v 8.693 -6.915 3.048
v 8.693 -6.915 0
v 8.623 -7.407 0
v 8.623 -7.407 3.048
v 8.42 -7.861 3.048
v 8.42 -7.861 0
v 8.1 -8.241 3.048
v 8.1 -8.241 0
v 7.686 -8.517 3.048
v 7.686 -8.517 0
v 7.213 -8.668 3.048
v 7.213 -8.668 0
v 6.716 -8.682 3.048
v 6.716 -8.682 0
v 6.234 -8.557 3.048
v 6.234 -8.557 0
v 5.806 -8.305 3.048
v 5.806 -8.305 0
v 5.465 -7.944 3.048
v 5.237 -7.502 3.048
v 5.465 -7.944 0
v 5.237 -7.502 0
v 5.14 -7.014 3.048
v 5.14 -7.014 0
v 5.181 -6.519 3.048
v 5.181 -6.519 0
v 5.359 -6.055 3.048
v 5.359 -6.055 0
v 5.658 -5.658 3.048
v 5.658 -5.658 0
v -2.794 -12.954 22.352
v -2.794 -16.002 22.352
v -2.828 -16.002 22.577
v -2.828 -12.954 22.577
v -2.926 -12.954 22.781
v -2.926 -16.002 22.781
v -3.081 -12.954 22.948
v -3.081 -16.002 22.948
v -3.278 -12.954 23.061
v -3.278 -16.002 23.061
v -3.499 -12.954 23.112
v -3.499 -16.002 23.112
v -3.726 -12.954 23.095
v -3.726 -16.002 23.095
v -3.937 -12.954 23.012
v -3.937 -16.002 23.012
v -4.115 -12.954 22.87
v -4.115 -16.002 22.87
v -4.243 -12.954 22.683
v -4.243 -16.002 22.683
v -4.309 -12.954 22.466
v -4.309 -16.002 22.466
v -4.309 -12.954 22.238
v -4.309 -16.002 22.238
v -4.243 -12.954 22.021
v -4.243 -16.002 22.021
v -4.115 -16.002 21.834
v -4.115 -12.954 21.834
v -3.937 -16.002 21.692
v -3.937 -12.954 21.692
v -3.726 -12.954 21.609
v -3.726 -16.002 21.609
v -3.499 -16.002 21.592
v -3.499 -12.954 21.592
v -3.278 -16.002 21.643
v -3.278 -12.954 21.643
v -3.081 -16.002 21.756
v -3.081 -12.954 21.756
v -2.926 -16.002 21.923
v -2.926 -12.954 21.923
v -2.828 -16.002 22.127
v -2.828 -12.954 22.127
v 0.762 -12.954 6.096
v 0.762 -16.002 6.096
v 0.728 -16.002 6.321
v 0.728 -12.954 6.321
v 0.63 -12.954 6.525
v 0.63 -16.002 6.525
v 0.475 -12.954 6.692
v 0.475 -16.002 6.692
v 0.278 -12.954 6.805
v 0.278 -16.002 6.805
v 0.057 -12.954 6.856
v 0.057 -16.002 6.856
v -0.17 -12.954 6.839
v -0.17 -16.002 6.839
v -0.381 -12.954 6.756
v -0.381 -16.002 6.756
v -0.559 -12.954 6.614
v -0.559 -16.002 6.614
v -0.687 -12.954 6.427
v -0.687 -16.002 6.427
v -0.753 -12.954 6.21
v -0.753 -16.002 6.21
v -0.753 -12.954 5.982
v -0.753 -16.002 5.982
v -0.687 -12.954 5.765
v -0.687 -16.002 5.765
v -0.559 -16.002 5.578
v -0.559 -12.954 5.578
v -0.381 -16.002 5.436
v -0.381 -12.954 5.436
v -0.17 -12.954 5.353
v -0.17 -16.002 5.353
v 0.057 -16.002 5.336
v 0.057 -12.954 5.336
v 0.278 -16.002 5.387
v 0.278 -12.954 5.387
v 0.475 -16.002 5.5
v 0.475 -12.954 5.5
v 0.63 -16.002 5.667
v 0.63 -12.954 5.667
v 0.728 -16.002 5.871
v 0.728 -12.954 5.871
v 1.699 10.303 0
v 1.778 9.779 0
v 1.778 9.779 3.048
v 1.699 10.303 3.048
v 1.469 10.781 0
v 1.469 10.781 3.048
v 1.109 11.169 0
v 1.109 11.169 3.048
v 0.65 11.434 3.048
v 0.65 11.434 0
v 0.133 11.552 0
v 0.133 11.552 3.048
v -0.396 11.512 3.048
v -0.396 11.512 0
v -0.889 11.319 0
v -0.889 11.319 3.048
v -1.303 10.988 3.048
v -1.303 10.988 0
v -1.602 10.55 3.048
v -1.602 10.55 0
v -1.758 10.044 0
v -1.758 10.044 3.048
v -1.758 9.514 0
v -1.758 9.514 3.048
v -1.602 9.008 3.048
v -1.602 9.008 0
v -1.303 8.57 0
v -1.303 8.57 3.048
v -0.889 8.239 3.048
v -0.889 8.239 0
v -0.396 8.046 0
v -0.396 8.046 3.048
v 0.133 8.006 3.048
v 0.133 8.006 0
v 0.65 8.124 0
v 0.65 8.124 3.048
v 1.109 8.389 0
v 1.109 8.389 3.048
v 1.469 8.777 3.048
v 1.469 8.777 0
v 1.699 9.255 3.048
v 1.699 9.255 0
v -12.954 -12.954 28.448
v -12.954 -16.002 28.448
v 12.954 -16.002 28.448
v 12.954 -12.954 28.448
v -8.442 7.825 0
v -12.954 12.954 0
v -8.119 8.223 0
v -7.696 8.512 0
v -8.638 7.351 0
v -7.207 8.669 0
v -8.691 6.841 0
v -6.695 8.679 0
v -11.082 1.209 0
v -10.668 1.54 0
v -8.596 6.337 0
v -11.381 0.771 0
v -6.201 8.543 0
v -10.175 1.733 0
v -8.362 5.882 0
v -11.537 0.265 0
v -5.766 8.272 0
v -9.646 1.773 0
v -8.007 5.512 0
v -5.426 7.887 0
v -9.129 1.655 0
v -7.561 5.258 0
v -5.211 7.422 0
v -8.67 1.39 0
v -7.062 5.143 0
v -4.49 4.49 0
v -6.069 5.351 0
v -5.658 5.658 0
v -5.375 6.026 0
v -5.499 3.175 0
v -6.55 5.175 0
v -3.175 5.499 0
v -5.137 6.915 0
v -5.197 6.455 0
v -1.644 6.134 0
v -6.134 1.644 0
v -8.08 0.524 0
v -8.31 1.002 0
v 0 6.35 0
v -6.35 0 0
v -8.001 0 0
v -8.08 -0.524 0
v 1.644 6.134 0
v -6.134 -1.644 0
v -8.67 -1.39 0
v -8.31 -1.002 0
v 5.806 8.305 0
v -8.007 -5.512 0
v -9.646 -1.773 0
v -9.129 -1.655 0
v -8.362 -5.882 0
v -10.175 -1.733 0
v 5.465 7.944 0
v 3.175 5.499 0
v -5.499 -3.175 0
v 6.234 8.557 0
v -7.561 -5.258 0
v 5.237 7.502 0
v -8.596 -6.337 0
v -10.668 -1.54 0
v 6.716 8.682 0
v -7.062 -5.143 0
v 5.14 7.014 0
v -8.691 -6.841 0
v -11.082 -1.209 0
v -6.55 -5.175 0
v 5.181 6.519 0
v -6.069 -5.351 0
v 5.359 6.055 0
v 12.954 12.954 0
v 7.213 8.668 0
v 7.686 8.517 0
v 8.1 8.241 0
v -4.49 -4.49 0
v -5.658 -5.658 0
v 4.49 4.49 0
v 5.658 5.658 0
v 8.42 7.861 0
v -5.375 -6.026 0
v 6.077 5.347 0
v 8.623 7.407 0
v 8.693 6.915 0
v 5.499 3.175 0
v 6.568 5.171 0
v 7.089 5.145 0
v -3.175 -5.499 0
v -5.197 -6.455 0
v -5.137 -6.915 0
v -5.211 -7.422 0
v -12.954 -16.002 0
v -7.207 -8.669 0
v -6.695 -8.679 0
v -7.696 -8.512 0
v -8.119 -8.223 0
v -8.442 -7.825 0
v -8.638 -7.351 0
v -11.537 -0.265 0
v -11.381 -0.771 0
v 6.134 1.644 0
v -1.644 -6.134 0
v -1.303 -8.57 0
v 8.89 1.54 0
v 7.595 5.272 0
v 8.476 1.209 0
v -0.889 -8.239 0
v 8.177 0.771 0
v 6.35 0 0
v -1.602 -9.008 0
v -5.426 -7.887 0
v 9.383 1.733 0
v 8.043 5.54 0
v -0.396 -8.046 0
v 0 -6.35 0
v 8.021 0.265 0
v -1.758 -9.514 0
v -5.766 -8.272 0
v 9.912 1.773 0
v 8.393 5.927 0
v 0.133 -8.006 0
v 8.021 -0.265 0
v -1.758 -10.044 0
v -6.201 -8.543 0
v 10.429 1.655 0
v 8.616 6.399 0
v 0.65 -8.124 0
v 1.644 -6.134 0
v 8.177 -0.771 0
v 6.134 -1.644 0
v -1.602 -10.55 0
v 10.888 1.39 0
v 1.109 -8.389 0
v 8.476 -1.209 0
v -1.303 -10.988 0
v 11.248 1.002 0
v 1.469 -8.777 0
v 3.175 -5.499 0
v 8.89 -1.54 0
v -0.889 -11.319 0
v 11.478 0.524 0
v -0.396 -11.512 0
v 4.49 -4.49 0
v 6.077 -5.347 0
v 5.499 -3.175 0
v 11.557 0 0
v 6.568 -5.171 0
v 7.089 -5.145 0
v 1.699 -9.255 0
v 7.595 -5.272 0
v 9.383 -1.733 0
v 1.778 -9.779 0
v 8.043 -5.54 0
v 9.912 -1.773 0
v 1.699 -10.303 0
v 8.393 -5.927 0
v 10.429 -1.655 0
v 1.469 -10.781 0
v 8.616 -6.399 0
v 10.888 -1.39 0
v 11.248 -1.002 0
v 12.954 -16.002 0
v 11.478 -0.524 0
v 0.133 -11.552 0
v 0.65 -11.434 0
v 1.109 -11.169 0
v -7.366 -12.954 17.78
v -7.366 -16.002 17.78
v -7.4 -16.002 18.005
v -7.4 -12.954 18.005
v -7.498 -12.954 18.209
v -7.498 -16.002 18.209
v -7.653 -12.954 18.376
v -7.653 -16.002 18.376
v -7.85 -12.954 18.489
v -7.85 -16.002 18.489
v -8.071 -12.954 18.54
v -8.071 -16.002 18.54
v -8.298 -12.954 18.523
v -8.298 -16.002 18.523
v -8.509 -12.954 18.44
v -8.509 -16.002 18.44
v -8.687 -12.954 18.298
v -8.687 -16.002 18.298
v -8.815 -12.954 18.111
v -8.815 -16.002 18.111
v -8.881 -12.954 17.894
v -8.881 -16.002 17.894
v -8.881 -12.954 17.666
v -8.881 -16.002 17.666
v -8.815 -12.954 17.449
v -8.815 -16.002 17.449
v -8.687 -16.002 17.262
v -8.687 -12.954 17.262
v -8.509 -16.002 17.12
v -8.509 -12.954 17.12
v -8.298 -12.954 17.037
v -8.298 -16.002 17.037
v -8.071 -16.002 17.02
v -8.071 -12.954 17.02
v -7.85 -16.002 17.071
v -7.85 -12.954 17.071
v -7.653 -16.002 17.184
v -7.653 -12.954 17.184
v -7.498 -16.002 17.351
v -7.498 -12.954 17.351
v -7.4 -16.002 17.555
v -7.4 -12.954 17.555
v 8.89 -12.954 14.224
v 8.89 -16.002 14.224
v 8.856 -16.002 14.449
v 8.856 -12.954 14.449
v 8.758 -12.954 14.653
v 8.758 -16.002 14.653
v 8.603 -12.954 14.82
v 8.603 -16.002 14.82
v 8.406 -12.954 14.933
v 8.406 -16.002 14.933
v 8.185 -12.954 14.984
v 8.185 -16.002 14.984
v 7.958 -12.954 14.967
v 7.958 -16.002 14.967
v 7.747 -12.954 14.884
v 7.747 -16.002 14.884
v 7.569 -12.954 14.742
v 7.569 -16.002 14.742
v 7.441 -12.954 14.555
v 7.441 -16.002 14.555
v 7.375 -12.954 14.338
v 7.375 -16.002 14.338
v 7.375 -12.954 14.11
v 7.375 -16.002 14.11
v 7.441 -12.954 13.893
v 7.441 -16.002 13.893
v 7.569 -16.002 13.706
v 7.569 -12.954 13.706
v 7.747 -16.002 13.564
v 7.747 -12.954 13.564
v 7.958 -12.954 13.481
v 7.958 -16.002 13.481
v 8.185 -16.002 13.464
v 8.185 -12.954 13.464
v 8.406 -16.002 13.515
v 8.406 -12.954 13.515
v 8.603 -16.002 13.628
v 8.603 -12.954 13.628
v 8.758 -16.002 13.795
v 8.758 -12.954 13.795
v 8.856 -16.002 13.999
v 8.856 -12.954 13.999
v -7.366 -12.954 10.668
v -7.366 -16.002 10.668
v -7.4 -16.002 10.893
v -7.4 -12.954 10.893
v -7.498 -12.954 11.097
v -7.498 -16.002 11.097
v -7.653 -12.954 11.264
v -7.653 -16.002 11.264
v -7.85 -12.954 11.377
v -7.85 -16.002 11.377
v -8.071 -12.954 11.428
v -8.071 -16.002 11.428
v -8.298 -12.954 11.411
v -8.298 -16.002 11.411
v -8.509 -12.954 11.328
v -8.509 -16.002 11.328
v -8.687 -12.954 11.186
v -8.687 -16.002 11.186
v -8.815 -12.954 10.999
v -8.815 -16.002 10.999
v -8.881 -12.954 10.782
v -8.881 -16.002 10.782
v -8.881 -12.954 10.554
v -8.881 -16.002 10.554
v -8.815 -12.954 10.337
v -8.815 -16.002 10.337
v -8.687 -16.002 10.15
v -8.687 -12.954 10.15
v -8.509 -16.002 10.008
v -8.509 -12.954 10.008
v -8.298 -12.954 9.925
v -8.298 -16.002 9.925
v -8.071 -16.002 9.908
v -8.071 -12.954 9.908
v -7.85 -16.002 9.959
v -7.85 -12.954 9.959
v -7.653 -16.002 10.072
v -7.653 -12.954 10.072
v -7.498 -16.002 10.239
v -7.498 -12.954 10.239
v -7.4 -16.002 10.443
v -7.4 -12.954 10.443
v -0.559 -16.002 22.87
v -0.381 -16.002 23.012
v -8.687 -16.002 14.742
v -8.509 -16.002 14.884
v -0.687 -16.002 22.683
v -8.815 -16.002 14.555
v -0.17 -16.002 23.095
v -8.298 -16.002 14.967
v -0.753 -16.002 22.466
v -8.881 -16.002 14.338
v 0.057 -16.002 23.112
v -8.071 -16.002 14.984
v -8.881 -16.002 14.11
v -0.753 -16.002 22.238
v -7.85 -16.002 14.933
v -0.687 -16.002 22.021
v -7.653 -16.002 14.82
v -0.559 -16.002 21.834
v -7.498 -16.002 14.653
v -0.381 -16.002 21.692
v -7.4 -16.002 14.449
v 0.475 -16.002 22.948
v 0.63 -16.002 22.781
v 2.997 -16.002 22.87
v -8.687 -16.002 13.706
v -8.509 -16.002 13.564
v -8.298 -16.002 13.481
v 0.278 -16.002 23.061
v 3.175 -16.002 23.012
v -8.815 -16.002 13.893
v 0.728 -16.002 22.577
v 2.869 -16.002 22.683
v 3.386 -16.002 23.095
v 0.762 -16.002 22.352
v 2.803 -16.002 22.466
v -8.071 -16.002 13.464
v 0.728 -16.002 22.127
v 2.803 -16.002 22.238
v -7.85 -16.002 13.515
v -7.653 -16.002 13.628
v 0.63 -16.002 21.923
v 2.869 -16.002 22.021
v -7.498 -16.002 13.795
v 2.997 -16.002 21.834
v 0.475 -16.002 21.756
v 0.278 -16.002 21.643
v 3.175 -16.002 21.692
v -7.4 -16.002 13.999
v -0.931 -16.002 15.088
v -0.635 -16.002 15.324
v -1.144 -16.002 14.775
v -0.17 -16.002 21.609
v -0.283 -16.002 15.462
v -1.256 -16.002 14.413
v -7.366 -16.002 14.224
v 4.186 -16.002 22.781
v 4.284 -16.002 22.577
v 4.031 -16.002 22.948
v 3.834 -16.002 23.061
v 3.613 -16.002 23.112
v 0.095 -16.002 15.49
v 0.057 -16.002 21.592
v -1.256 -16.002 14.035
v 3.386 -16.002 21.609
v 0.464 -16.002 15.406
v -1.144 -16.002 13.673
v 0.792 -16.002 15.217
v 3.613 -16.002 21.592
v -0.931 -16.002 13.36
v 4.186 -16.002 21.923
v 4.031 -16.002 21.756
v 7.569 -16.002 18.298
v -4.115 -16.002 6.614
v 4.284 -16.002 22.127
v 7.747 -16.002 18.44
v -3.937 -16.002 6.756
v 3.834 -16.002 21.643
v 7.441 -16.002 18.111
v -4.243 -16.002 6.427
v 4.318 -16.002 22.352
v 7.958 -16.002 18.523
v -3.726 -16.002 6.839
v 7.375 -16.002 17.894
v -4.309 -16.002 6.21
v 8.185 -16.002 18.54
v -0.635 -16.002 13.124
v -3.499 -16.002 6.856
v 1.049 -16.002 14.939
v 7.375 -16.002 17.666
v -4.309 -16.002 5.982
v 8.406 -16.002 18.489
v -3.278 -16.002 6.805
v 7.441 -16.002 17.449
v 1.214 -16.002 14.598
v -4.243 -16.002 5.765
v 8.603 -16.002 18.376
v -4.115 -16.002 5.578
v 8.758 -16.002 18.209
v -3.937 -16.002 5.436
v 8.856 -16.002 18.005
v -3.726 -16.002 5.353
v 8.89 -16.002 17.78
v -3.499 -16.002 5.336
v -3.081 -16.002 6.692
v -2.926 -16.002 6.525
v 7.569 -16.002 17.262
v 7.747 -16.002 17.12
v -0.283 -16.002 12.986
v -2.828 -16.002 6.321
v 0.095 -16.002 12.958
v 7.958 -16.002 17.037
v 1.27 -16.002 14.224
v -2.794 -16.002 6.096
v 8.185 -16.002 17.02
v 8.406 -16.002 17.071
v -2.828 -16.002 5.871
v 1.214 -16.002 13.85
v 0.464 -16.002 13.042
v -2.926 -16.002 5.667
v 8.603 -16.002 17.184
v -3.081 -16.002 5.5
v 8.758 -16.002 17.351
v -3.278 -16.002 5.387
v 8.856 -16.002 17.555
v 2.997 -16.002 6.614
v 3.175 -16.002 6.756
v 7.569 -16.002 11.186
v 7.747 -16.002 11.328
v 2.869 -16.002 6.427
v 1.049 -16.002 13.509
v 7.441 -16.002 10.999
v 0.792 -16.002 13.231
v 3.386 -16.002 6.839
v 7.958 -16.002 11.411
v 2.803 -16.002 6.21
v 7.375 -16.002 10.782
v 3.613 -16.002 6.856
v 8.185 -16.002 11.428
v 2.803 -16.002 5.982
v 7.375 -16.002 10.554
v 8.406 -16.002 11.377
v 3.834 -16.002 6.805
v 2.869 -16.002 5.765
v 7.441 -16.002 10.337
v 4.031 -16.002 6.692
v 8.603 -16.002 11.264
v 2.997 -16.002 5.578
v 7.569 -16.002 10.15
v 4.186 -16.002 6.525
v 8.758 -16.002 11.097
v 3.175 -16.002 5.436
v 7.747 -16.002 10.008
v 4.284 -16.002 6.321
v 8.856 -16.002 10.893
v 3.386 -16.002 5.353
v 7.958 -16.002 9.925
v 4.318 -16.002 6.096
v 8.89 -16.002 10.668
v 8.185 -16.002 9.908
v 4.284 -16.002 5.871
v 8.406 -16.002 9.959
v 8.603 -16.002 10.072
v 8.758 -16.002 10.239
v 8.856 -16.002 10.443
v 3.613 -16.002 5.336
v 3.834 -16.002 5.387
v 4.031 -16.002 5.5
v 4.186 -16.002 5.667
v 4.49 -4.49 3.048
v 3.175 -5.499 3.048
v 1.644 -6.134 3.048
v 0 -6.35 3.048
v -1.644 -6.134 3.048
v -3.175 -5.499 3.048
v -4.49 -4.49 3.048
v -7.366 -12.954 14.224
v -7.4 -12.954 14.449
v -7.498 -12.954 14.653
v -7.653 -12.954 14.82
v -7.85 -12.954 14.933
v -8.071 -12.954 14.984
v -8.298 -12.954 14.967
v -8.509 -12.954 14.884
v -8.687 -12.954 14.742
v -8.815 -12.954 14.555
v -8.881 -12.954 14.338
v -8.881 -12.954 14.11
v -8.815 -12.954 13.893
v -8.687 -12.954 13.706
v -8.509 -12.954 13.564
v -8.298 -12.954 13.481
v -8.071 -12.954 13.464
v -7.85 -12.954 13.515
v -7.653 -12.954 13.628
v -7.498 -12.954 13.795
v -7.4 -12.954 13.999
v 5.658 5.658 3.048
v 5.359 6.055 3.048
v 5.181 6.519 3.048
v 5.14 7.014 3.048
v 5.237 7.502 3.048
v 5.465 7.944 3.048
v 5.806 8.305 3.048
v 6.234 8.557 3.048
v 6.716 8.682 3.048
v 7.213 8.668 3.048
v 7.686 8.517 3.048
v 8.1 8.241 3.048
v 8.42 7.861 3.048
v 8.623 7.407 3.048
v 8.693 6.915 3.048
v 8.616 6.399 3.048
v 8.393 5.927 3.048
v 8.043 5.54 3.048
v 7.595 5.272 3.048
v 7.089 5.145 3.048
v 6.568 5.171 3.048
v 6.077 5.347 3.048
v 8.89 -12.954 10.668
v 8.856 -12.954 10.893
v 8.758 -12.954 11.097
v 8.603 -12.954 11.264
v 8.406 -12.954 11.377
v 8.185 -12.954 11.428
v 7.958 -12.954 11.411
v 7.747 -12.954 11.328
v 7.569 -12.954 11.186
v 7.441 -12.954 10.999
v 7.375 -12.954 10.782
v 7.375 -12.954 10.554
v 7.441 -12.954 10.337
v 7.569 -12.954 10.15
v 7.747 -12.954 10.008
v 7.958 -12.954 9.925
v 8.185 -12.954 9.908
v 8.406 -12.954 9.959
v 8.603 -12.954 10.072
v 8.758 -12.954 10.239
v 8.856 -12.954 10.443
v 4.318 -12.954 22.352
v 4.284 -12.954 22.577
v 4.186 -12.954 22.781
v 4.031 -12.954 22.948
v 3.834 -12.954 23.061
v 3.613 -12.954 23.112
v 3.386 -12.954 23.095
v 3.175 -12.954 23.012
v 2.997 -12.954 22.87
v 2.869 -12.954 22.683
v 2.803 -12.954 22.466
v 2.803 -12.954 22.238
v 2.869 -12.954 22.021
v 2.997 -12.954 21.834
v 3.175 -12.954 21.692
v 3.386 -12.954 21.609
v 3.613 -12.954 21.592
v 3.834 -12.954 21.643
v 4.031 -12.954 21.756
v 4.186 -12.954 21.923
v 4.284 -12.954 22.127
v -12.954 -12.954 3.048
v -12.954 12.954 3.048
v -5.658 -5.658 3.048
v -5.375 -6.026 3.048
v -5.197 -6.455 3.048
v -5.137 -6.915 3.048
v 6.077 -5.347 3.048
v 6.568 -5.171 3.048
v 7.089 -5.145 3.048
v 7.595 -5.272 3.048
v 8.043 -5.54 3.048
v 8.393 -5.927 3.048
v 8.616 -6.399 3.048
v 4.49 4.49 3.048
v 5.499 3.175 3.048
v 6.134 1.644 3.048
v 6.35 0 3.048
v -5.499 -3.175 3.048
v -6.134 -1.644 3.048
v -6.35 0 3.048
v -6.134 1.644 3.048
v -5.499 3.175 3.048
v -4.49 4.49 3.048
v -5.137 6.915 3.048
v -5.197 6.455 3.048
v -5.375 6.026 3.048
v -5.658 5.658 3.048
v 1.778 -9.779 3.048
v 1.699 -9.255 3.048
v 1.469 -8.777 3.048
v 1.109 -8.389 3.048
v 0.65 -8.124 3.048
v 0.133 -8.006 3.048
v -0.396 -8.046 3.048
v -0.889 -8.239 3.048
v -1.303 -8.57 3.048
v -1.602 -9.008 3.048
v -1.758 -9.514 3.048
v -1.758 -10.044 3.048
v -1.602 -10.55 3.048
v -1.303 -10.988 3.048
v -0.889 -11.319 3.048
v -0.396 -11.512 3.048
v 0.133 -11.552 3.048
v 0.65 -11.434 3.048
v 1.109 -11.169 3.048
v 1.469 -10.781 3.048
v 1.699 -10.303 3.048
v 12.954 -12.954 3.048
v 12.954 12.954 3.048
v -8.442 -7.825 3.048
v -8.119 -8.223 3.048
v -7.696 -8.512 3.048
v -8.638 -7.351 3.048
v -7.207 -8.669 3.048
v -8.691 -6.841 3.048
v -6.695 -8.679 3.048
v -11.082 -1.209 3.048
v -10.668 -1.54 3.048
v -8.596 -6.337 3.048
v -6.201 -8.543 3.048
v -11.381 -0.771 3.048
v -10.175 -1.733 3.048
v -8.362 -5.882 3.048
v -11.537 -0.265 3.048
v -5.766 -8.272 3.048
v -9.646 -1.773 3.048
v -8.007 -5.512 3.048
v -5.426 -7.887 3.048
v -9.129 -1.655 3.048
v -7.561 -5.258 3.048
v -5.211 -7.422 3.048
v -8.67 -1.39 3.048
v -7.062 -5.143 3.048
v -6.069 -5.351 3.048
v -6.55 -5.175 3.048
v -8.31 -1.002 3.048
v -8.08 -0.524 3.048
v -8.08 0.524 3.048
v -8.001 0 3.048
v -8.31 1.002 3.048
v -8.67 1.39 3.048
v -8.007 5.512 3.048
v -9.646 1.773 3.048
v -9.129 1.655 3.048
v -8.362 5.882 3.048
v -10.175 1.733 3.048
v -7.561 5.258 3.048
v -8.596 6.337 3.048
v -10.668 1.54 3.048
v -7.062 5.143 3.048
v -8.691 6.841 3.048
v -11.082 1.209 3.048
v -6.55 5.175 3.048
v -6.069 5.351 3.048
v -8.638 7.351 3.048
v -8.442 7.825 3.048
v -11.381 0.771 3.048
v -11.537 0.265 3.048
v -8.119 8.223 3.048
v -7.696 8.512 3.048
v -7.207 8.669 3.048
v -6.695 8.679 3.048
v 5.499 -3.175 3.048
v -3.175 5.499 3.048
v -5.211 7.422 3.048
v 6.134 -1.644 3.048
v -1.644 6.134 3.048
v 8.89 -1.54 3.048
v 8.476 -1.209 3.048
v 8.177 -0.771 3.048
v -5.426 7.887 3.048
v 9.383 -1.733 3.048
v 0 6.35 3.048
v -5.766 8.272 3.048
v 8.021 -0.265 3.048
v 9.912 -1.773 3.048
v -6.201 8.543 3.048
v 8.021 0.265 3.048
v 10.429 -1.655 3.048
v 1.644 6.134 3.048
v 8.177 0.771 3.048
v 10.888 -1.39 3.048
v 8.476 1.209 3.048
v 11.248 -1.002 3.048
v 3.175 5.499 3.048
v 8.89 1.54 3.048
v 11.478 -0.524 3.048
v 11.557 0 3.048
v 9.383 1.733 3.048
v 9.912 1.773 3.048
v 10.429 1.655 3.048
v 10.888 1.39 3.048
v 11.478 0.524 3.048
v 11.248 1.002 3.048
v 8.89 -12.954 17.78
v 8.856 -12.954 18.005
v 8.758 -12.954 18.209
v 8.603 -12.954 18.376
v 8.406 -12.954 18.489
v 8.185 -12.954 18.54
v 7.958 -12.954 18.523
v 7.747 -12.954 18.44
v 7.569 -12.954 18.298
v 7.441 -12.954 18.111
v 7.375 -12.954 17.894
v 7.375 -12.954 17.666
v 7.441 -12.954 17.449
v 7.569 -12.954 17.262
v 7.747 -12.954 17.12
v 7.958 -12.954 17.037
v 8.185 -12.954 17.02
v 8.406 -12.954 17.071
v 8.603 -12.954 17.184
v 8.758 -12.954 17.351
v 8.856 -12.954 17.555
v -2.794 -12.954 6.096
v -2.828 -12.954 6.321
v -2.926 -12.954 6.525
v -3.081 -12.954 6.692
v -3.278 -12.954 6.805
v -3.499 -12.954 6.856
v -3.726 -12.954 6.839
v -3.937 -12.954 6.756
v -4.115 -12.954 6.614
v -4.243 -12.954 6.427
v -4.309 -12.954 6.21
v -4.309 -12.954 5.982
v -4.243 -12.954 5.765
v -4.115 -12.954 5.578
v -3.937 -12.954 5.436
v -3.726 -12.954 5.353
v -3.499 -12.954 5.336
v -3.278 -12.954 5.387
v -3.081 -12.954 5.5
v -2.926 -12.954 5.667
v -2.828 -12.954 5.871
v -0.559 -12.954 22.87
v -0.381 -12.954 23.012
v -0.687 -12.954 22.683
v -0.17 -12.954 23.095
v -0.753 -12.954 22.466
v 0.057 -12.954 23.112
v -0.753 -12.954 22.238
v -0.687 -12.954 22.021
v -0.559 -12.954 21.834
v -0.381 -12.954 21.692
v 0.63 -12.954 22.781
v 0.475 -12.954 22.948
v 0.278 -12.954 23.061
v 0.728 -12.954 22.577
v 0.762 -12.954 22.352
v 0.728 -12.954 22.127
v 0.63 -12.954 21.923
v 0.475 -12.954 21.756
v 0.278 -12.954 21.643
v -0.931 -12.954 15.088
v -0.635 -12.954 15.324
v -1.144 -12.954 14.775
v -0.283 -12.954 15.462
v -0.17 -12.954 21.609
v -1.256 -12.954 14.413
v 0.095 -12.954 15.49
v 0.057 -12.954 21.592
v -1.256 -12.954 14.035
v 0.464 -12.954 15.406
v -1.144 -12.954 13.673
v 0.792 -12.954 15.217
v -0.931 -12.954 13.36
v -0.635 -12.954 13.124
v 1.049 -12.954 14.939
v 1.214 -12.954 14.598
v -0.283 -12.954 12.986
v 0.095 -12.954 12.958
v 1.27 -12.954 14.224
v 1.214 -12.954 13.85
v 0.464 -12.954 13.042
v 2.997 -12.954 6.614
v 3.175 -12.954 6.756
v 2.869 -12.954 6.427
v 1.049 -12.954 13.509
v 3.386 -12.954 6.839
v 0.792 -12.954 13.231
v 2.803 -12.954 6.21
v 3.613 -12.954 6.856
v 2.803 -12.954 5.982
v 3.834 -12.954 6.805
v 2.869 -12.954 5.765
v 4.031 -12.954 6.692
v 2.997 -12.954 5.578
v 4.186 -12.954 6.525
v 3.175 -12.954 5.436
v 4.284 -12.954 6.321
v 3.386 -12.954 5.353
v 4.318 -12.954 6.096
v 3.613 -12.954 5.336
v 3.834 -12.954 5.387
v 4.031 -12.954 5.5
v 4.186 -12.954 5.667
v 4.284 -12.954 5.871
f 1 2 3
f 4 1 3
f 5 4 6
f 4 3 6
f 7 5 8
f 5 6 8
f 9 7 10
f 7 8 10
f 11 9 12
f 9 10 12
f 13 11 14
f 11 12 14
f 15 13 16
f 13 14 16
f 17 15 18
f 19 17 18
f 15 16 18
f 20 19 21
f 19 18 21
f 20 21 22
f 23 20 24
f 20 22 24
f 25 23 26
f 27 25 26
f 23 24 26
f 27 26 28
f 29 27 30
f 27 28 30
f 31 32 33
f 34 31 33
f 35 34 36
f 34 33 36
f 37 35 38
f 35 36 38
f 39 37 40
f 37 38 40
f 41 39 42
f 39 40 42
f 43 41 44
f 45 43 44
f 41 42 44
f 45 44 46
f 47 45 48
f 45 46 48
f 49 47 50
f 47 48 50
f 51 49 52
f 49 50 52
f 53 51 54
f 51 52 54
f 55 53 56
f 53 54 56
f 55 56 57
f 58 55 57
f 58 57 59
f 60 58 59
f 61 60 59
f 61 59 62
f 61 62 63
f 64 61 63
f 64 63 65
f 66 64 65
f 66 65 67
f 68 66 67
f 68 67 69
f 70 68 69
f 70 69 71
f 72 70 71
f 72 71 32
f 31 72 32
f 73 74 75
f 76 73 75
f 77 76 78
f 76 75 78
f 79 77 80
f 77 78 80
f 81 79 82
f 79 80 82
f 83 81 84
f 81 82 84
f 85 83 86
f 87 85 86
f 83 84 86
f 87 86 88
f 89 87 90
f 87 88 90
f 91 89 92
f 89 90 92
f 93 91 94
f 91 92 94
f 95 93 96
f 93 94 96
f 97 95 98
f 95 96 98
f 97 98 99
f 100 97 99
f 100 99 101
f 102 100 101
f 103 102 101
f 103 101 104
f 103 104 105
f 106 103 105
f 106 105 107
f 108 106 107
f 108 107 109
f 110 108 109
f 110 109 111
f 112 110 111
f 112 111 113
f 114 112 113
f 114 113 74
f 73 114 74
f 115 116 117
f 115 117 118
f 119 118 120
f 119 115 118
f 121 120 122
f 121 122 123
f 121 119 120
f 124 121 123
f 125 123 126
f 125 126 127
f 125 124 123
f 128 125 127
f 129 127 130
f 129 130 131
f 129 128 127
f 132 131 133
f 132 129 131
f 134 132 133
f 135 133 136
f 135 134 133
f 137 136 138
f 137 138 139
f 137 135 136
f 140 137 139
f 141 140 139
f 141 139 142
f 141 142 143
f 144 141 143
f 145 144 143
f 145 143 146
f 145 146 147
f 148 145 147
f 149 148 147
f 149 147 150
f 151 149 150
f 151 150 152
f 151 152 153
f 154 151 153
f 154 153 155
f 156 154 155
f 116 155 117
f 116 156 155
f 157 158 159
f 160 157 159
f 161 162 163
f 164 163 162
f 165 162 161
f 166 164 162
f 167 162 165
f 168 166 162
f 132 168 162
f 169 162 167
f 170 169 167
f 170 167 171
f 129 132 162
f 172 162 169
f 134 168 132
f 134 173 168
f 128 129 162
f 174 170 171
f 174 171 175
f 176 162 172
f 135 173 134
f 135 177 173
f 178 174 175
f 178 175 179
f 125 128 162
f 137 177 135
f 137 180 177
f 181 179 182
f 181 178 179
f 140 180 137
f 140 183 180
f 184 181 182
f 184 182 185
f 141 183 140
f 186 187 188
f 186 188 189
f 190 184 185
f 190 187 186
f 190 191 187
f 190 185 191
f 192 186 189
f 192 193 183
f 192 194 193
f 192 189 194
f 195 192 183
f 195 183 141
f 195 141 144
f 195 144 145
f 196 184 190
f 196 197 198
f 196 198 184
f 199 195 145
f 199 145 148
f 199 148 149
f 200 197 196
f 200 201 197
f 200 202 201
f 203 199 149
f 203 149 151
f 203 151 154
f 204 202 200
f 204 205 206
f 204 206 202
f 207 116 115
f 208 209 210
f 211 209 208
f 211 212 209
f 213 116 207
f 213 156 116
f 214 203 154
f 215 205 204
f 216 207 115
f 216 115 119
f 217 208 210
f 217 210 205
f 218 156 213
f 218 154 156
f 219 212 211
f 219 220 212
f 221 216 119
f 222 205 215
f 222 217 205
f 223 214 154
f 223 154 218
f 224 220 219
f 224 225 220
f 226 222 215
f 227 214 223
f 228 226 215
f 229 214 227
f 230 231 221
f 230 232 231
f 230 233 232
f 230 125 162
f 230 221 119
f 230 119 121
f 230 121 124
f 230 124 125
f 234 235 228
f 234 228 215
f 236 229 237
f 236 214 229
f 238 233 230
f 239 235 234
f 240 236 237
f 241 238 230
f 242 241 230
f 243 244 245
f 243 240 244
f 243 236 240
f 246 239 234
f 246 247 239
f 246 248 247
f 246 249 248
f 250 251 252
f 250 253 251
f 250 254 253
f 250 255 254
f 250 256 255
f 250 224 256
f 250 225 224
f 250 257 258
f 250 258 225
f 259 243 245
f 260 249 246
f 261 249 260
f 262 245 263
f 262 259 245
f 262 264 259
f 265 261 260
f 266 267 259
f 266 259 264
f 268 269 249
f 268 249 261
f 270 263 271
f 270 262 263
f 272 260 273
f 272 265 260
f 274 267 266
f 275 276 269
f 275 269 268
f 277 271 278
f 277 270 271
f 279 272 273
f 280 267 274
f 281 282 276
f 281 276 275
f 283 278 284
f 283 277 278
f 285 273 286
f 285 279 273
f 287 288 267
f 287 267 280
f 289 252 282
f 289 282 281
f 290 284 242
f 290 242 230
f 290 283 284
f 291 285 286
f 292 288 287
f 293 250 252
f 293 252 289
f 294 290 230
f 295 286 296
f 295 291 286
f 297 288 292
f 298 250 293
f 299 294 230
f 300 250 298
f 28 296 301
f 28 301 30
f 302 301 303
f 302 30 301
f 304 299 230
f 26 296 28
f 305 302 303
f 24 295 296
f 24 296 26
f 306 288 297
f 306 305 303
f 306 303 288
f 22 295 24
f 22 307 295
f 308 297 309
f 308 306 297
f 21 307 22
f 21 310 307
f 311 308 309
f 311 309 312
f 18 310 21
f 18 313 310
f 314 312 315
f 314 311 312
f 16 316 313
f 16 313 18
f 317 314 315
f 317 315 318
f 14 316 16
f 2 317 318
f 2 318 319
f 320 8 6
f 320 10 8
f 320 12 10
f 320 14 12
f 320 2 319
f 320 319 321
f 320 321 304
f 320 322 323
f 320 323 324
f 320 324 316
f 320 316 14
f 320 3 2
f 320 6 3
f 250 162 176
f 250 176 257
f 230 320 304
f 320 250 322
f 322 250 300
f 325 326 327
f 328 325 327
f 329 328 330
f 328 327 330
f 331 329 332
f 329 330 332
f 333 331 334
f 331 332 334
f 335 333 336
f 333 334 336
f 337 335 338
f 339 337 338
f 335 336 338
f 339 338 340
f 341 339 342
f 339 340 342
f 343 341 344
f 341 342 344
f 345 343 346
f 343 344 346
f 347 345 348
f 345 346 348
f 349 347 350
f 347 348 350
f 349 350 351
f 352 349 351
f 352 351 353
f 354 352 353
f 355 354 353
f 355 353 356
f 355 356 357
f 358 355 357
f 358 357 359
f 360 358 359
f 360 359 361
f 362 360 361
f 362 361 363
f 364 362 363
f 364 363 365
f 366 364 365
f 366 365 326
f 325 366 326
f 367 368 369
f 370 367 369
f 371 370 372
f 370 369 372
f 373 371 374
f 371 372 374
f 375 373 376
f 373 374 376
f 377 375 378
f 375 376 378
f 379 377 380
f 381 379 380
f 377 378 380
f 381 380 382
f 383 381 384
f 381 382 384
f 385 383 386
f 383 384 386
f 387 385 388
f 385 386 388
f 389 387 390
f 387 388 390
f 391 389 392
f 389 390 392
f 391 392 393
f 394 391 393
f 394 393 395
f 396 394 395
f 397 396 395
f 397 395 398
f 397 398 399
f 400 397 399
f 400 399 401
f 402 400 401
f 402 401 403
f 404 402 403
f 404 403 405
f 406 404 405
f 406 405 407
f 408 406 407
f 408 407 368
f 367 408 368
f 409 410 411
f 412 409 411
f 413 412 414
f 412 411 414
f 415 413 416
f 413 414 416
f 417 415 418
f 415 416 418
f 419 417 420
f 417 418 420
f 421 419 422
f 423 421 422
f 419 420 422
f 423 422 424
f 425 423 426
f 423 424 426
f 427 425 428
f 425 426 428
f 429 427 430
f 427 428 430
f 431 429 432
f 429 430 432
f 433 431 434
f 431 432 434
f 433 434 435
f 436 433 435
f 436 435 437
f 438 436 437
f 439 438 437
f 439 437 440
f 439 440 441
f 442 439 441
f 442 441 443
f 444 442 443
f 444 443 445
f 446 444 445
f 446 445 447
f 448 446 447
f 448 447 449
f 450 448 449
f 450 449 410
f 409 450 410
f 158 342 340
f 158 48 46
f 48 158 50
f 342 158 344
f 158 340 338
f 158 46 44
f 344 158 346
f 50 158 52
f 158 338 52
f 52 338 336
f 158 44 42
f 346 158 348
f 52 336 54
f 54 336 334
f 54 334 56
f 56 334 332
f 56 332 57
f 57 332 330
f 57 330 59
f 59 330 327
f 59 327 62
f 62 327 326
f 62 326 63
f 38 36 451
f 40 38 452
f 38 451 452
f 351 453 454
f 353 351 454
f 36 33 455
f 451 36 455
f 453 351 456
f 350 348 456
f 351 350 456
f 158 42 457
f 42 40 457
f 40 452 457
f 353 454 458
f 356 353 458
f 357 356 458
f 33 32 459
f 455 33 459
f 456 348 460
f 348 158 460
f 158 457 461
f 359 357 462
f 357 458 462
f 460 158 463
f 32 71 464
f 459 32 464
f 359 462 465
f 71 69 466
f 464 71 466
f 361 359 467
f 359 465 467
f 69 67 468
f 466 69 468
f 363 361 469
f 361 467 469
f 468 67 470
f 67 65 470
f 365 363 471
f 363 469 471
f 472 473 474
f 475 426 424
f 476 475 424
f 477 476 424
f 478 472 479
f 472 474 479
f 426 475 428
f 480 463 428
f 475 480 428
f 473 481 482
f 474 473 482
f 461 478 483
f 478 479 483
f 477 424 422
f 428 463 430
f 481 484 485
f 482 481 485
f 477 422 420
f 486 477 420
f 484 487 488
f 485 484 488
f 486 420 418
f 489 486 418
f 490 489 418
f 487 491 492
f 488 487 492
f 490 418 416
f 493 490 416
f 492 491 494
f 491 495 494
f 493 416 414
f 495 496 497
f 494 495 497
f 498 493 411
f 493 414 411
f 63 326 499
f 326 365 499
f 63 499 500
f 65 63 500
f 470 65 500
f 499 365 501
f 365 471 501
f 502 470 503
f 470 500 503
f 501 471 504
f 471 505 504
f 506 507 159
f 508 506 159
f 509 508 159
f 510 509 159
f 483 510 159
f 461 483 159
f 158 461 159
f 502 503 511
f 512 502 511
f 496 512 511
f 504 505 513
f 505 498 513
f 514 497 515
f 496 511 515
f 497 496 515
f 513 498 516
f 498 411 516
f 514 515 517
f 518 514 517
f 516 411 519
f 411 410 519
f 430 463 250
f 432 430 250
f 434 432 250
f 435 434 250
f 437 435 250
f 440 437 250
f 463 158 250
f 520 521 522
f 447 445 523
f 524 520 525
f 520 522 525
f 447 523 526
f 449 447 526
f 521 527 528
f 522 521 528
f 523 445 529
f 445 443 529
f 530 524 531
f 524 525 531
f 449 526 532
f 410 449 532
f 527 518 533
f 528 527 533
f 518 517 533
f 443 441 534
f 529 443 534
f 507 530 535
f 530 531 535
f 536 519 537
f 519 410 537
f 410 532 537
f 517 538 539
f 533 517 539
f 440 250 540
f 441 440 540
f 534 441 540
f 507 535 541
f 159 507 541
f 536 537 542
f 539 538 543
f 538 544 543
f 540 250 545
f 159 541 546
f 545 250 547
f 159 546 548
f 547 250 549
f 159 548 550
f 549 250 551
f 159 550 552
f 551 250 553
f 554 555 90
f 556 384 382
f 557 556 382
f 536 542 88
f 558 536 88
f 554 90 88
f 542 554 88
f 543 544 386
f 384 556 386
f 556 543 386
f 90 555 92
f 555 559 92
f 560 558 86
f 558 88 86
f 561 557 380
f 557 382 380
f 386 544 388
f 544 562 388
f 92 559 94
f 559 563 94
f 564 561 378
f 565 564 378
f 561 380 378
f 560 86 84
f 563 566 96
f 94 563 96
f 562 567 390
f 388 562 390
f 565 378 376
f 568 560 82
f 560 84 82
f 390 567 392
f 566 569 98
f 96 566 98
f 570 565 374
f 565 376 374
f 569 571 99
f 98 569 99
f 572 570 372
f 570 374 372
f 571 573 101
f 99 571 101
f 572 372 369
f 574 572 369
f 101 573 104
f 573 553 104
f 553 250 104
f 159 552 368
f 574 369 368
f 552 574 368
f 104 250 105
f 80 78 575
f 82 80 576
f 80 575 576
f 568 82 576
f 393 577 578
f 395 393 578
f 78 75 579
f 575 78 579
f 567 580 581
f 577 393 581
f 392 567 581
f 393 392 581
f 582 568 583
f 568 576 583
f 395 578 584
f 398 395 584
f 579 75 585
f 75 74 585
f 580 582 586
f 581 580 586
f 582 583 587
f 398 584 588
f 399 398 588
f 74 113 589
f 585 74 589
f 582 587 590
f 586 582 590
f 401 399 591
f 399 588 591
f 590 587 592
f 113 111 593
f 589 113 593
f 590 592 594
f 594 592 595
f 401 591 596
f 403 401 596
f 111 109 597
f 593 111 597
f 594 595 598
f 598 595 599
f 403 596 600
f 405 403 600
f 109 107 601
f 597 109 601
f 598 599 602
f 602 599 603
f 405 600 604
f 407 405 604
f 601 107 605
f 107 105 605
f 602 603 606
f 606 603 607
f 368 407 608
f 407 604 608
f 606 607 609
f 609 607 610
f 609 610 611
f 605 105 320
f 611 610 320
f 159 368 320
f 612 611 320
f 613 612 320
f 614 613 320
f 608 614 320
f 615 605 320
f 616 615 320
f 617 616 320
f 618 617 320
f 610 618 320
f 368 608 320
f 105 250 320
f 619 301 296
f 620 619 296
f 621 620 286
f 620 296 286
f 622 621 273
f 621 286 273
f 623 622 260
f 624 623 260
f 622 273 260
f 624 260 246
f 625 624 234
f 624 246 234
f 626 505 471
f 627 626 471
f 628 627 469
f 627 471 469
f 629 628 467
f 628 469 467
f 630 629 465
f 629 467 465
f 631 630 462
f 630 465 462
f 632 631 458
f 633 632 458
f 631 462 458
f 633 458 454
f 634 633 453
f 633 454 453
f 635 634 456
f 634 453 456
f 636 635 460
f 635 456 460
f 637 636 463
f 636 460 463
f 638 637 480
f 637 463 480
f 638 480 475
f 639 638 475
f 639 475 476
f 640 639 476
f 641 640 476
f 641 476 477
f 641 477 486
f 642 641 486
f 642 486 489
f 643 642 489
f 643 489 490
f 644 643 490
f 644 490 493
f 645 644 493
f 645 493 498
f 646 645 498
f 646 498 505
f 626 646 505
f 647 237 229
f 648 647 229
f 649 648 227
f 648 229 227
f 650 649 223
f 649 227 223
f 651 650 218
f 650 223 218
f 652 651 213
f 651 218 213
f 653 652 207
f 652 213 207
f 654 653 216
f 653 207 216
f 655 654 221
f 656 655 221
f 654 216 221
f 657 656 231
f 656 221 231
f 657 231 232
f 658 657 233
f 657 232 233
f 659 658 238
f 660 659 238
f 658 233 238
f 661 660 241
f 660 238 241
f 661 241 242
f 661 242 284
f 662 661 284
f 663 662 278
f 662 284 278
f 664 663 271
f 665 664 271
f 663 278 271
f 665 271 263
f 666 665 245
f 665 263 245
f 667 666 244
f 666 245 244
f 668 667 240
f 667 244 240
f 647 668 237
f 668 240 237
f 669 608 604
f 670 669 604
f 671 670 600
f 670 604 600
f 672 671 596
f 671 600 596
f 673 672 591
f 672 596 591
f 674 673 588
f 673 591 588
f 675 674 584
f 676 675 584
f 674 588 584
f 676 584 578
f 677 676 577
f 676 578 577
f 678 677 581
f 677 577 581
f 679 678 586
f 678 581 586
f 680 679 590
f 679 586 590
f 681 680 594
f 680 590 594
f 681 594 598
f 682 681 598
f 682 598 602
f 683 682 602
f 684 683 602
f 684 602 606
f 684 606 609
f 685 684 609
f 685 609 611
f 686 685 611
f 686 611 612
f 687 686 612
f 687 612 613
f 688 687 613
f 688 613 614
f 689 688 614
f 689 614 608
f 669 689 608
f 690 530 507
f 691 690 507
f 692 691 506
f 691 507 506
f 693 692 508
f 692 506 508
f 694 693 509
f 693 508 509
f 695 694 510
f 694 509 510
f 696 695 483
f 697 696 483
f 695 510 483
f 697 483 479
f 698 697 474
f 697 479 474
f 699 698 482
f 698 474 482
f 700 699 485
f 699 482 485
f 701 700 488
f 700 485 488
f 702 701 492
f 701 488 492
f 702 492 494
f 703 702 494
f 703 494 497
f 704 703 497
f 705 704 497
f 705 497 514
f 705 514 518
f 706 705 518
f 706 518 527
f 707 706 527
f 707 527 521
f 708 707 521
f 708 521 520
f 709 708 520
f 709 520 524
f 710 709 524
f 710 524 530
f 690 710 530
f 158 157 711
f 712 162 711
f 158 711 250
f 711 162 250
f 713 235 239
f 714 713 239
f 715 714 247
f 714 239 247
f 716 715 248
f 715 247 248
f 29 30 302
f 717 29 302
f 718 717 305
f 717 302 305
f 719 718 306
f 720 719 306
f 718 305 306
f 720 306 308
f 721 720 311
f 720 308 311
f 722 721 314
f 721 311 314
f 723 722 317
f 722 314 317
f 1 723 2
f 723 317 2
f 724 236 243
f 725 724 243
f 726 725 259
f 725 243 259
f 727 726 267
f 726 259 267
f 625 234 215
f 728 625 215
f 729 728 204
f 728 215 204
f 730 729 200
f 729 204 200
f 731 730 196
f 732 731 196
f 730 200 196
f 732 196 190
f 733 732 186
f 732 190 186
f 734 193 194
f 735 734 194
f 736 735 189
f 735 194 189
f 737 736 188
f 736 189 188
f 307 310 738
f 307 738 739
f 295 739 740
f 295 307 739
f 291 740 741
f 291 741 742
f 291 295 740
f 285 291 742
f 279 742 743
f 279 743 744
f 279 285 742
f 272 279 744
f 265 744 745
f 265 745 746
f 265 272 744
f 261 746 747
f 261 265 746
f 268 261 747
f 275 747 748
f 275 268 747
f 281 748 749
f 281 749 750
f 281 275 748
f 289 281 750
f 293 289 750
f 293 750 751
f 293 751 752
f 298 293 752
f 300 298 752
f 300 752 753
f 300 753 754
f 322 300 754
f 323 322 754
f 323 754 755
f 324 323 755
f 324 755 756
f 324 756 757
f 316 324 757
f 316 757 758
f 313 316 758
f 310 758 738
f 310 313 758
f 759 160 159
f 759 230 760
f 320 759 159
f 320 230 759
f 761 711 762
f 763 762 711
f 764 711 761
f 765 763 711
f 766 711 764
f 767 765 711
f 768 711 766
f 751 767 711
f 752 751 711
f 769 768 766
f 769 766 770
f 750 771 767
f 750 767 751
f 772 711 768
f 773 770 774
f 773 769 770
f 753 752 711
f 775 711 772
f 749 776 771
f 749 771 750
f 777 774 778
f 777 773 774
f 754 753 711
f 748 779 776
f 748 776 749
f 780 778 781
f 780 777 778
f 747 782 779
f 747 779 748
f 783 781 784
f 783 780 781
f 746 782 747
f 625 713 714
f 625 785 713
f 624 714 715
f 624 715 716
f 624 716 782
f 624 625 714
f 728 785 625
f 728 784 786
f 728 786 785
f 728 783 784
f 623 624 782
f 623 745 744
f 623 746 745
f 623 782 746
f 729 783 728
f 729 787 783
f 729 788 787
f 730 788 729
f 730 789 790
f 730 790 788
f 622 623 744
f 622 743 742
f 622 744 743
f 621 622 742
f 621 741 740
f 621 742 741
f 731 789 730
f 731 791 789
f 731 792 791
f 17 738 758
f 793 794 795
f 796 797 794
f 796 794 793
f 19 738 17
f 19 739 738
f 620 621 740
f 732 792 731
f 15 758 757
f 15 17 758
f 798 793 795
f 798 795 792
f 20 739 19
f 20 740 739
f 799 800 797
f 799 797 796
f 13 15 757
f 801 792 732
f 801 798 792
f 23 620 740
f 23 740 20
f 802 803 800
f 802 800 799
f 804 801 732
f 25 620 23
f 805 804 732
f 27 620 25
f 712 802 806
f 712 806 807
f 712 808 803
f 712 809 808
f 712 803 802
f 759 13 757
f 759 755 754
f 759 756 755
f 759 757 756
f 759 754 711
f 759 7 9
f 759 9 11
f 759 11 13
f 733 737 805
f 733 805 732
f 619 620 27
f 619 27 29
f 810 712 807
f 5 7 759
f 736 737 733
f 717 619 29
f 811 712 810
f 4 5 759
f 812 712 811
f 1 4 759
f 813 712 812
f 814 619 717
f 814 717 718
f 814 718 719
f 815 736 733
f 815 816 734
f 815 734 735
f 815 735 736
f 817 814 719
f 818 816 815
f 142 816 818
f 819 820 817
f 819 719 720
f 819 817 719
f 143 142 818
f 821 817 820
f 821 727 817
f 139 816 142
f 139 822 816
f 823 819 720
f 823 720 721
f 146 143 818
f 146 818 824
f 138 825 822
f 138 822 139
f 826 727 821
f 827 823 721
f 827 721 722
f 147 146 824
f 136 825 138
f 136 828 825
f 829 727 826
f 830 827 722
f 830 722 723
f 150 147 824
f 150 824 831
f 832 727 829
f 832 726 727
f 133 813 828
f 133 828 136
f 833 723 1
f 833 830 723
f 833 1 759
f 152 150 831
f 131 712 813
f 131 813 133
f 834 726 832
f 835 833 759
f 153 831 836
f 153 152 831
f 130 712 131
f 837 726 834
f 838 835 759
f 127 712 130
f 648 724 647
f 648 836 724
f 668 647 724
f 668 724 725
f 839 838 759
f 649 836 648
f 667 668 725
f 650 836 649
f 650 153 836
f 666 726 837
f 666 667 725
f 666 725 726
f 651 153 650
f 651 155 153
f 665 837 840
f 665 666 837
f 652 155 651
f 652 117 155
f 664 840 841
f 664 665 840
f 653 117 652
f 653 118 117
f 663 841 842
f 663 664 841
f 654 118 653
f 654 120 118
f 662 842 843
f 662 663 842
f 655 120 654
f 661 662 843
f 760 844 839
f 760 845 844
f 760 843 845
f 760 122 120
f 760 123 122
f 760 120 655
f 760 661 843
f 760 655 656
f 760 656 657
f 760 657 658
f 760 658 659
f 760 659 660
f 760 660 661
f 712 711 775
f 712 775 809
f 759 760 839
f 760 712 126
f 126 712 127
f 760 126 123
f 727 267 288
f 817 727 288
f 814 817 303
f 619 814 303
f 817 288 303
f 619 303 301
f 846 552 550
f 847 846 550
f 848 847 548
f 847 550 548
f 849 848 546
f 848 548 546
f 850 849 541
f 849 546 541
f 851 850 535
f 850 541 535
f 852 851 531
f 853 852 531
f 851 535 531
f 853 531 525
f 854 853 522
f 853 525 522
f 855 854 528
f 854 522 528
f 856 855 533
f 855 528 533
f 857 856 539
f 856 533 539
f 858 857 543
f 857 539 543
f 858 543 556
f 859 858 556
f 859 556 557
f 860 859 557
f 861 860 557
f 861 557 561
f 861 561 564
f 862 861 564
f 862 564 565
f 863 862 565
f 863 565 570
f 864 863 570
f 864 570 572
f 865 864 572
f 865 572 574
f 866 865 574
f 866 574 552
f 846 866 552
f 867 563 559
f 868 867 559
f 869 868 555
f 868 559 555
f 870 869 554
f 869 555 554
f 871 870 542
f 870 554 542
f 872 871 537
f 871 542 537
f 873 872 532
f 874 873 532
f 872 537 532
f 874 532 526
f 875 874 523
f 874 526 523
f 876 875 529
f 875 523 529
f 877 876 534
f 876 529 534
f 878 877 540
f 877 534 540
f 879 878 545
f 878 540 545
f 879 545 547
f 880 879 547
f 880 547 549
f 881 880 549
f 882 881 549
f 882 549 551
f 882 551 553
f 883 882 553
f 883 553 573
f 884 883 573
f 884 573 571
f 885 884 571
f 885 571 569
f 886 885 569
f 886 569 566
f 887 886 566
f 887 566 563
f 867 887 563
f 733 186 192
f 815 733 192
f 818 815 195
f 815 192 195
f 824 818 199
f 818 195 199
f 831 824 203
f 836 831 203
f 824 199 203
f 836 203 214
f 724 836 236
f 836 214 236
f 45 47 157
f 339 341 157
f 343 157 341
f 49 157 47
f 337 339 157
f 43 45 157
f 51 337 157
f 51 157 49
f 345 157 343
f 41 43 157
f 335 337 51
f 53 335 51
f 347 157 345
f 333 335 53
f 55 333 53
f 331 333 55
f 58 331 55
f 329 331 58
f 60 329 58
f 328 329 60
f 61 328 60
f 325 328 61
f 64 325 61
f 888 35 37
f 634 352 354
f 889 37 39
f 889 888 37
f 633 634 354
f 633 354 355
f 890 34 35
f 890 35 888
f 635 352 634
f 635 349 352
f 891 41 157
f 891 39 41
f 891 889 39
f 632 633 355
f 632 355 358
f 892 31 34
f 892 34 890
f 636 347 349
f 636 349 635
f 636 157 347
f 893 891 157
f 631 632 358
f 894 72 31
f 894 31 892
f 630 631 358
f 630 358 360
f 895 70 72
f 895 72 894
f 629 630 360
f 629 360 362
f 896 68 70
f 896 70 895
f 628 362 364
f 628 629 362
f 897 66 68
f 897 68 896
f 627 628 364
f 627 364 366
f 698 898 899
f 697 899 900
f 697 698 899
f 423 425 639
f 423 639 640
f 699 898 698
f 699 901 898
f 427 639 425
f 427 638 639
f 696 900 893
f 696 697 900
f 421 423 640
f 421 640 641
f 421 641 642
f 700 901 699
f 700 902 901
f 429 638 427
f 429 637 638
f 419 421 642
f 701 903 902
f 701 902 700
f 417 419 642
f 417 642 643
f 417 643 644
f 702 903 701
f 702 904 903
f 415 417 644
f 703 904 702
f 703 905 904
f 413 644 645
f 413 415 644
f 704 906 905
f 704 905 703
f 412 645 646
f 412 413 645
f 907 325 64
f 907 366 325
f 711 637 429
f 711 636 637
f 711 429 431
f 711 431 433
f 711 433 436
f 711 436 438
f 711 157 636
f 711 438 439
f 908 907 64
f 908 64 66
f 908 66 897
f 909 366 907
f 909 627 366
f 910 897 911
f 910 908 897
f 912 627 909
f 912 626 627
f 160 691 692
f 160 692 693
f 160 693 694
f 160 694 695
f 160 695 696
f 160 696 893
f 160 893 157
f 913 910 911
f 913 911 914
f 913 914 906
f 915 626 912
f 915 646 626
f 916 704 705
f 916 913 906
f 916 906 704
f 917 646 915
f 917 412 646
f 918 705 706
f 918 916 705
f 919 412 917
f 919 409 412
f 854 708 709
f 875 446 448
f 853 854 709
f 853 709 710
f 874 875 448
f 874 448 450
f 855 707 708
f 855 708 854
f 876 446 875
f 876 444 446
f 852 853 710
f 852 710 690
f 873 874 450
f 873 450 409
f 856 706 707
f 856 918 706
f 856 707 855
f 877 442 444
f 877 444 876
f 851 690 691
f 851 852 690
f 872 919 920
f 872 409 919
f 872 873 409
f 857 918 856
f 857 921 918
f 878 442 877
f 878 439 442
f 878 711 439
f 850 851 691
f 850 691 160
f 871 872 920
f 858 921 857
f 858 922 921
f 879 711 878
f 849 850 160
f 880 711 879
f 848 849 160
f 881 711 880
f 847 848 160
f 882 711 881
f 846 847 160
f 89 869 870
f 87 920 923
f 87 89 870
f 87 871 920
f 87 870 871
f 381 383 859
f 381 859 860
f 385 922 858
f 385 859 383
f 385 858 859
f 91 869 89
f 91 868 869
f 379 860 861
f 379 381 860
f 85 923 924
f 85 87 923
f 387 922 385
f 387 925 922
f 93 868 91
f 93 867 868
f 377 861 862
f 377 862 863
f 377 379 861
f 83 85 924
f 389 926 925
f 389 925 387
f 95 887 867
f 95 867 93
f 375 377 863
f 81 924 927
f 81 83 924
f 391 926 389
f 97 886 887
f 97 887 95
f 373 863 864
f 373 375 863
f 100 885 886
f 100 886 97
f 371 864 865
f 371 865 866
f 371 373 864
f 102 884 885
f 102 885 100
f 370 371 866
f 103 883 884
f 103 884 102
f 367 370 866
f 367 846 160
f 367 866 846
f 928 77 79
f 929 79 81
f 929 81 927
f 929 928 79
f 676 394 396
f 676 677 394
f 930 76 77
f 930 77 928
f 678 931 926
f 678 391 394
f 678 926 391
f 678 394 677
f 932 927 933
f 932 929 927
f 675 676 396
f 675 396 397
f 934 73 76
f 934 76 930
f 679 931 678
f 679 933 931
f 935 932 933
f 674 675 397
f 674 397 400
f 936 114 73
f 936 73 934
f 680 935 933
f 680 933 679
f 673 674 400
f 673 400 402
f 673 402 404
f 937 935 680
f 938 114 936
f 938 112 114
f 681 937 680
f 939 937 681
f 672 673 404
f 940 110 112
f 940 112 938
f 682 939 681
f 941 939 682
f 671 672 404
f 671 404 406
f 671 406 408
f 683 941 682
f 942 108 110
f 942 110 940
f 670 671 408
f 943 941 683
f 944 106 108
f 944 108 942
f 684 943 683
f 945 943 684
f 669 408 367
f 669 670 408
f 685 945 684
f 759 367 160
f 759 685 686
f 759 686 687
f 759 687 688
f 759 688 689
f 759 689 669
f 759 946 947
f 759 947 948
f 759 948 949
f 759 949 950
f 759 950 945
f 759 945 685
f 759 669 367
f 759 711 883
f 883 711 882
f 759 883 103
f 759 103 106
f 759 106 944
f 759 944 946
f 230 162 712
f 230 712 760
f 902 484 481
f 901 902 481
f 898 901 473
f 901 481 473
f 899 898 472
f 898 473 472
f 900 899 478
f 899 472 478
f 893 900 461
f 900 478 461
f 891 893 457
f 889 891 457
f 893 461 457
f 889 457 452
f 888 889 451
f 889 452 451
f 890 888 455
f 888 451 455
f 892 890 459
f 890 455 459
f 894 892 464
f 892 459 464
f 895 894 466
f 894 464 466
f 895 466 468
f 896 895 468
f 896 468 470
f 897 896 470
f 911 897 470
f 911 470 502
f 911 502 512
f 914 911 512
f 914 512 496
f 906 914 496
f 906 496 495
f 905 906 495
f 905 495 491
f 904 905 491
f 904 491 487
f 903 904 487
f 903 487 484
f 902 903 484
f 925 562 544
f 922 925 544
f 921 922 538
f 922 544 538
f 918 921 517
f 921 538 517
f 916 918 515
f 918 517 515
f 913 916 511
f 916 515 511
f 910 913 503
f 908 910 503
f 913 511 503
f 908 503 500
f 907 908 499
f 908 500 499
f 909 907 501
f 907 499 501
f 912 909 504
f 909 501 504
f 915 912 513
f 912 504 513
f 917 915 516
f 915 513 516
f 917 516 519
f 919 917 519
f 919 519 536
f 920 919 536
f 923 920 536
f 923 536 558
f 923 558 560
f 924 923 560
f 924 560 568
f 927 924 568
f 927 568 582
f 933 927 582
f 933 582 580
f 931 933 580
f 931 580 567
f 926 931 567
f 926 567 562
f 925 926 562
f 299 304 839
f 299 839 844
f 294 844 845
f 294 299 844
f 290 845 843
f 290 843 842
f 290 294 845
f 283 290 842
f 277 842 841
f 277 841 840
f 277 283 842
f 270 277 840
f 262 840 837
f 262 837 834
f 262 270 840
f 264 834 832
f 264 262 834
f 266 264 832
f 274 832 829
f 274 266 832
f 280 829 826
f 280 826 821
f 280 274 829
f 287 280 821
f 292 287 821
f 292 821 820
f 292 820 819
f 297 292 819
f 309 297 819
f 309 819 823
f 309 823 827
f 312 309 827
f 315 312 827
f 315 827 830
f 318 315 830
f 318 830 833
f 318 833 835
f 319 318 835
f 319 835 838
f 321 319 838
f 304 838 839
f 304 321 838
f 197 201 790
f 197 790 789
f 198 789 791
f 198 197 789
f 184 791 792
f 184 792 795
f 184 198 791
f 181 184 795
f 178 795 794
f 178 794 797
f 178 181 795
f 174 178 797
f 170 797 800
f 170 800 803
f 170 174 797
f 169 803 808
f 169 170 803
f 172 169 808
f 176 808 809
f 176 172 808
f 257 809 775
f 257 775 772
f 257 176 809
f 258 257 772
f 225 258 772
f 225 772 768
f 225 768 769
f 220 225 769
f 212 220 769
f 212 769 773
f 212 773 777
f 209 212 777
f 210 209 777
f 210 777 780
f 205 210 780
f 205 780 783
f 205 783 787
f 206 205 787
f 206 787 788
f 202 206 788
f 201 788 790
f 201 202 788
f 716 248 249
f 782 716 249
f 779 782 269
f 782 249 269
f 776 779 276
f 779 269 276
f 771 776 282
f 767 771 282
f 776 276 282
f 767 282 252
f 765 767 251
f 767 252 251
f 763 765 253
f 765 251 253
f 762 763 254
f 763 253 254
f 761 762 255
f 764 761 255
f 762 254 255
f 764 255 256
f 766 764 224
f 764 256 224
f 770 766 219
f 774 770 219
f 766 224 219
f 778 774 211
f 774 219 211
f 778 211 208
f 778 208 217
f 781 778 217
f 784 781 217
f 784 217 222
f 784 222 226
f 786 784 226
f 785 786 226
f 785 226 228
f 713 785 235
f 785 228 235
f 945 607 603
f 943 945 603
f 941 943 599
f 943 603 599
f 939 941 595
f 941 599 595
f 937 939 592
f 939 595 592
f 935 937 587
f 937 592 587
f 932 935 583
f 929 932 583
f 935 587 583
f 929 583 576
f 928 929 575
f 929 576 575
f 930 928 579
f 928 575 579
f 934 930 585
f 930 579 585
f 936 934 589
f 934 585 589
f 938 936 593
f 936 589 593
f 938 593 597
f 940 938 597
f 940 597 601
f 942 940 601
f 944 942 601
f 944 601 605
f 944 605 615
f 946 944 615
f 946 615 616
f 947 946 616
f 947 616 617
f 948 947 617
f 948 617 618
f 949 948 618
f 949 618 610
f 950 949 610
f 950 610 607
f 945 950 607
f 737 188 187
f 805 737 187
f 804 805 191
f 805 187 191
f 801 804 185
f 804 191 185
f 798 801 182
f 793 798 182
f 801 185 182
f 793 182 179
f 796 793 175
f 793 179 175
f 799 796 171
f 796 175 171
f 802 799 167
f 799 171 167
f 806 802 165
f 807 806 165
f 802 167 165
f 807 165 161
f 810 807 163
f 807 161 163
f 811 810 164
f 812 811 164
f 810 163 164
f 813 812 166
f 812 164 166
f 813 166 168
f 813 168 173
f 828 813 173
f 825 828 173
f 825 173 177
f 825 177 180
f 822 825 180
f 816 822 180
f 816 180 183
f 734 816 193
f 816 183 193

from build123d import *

# Parameters (mm, degrees)
F0_W     = 25.908
F0_H     = 25.908
F0_R     = 1.778
F1_DEPTH = 3.048
F2_W     = 25.908
F2_H     = 3.048
F3_DEPTH = 28.448
F4_R     = 0.762
F4_R_2   = 1.27
F5_DEPTH = 25.4


with BuildPart() as f1:
    # F0 (on Top) → F1 (new body)
    with BuildSketch(Plane.XY):
        Rectangle(F0_W, F0_H)
        with BuildLine():
            ThreePointArc((-5.1367972132, -6.9147972132), (-8.557455022, -7.595208356), (-5.6575613563, -5.6575613563))
            ThreePointArc((-5.6575613563, -5.6575613563), (-5.2721394044, -6.2343860705), (-5.1367972132, -6.9147972132))
        make_face(mode=Mode.SUBTRACT)
        with Locations((0, -9.779)):
            Circle(F0_R, mode=Mode.SUBTRACT)
        with BuildLine():
            ThreePointArc((8.6927972132, -6.9147972132), (6.2343860705, -8.557455022), (5.6575613563, -5.6575613563))
            ThreePointArc((5.6575613563, -5.6575613563), (7.595208356, -5.2721394044), (8.6927972132, -6.9147972132))
        make_face(mode=Mode.SUBTRACT)
        with Locations((-9.779, 0)):
            Circle(F0_R, mode=Mode.SUBTRACT)
        with BuildLine():
            ThreePointArc((-5.1367972132, 6.9147972132), (-5.2721394044, 6.2343860705), (-5.6575613563, 5.6575613563))
            ThreePointArc((-5.6575613563, 5.6575613563), (-8.557455022, 7.595208356), (-5.1367972132, 6.9147972132))
        make_face(mode=Mode.SUBTRACT)
        with BuildLine():
            ThreePointArc((4.4901280605, 4.4901280605), (5.8666350314, 2.4300397955), (6.35, 0))
            ThreePointArc((6.35, 0), (5.8666350314, -2.4300397955), (4.4901280605, -4.4901280605))
            ThreePointArc((4.4901280605, -4.4901280605), (0, -6.35), (-4.4901280605, -4.4901280605))
            ThreePointArc((-4.4901280605, -4.4901280605), (-6.35, 0), (-4.4901280605, 4.4901280605))
            ThreePointArc((-4.4901280605, 4.4901280605), (0, 6.35), (4.4901280605, 4.4901280605))
        make_face(mode=Mode.SUBTRACT)
        with Locations((9.779, 0)):
            Circle(F0_R, mode=Mode.SUBTRACT)
        with Locations((0, 9.779)):
            Circle(F0_R, mode=Mode.SUBTRACT)
        with BuildLine():
            ThreePointArc((8.6927972132, 6.9147972132), (7.595208356, 5.2721394044), (5.6575613563, 5.6575613563))
            ThreePointArc((5.6575613563, 5.6575613563), (6.2343860705, 8.557455022), (8.6927972132, 6.9147972132))
        make_face(mode=Mode.SUBTRACT)
    extrude(amount=F1_DEPTH)

    # F2 (on face) → F3 (join)
    with BuildSketch(Plane(origin=(0, 0, 0), x_dir=(1, 0, 0), z_dir=(0, 0, -1))):
        with Locations((0, 14.478)):
            Rectangle(F2_W, F2_H)
    extrude(amount=-F3_DEPTH)

    # F4 (on face) → F5 (cut)
    with BuildSketch(Plane.XZ.offset(16.002)):
        with Locations((-8.128, 14.224)):
            Circle(F4_R)
        with Locations((-8.128, 17.78)):
            Circle(F4_R)
        with Locations((-8.128, 10.668)):
            Circle(F4_R)
        with Locations((-3.556, 6.096)):
            Circle(F4_R)
        with Locations((0, 6.096)):
            Circle(F4_R)
        with Locations((3.556, 6.096)):
            Circle(F4_R)
        with Locations((8.128, 10.668)):
            Circle(F4_R)
        with Locations((8.128, 14.224)):
            Circle(F4_R)
        with Locations((8.128, 17.78)):
            Circle(F4_R)
        with Locations((3.556, 22.352)):
            Circle(F4_R)
        with Locations((0, 22.352)):
            Circle(F4_R)
        with Locations((-3.556, 22.352)):
            Circle(F4_R)
        with Locations((0, 14.224)):
            Circle(F4_R_2)
    extrude(amount=-F5_DEPTH, mode=Mode.SUBTRACT)


solid = f1.part
